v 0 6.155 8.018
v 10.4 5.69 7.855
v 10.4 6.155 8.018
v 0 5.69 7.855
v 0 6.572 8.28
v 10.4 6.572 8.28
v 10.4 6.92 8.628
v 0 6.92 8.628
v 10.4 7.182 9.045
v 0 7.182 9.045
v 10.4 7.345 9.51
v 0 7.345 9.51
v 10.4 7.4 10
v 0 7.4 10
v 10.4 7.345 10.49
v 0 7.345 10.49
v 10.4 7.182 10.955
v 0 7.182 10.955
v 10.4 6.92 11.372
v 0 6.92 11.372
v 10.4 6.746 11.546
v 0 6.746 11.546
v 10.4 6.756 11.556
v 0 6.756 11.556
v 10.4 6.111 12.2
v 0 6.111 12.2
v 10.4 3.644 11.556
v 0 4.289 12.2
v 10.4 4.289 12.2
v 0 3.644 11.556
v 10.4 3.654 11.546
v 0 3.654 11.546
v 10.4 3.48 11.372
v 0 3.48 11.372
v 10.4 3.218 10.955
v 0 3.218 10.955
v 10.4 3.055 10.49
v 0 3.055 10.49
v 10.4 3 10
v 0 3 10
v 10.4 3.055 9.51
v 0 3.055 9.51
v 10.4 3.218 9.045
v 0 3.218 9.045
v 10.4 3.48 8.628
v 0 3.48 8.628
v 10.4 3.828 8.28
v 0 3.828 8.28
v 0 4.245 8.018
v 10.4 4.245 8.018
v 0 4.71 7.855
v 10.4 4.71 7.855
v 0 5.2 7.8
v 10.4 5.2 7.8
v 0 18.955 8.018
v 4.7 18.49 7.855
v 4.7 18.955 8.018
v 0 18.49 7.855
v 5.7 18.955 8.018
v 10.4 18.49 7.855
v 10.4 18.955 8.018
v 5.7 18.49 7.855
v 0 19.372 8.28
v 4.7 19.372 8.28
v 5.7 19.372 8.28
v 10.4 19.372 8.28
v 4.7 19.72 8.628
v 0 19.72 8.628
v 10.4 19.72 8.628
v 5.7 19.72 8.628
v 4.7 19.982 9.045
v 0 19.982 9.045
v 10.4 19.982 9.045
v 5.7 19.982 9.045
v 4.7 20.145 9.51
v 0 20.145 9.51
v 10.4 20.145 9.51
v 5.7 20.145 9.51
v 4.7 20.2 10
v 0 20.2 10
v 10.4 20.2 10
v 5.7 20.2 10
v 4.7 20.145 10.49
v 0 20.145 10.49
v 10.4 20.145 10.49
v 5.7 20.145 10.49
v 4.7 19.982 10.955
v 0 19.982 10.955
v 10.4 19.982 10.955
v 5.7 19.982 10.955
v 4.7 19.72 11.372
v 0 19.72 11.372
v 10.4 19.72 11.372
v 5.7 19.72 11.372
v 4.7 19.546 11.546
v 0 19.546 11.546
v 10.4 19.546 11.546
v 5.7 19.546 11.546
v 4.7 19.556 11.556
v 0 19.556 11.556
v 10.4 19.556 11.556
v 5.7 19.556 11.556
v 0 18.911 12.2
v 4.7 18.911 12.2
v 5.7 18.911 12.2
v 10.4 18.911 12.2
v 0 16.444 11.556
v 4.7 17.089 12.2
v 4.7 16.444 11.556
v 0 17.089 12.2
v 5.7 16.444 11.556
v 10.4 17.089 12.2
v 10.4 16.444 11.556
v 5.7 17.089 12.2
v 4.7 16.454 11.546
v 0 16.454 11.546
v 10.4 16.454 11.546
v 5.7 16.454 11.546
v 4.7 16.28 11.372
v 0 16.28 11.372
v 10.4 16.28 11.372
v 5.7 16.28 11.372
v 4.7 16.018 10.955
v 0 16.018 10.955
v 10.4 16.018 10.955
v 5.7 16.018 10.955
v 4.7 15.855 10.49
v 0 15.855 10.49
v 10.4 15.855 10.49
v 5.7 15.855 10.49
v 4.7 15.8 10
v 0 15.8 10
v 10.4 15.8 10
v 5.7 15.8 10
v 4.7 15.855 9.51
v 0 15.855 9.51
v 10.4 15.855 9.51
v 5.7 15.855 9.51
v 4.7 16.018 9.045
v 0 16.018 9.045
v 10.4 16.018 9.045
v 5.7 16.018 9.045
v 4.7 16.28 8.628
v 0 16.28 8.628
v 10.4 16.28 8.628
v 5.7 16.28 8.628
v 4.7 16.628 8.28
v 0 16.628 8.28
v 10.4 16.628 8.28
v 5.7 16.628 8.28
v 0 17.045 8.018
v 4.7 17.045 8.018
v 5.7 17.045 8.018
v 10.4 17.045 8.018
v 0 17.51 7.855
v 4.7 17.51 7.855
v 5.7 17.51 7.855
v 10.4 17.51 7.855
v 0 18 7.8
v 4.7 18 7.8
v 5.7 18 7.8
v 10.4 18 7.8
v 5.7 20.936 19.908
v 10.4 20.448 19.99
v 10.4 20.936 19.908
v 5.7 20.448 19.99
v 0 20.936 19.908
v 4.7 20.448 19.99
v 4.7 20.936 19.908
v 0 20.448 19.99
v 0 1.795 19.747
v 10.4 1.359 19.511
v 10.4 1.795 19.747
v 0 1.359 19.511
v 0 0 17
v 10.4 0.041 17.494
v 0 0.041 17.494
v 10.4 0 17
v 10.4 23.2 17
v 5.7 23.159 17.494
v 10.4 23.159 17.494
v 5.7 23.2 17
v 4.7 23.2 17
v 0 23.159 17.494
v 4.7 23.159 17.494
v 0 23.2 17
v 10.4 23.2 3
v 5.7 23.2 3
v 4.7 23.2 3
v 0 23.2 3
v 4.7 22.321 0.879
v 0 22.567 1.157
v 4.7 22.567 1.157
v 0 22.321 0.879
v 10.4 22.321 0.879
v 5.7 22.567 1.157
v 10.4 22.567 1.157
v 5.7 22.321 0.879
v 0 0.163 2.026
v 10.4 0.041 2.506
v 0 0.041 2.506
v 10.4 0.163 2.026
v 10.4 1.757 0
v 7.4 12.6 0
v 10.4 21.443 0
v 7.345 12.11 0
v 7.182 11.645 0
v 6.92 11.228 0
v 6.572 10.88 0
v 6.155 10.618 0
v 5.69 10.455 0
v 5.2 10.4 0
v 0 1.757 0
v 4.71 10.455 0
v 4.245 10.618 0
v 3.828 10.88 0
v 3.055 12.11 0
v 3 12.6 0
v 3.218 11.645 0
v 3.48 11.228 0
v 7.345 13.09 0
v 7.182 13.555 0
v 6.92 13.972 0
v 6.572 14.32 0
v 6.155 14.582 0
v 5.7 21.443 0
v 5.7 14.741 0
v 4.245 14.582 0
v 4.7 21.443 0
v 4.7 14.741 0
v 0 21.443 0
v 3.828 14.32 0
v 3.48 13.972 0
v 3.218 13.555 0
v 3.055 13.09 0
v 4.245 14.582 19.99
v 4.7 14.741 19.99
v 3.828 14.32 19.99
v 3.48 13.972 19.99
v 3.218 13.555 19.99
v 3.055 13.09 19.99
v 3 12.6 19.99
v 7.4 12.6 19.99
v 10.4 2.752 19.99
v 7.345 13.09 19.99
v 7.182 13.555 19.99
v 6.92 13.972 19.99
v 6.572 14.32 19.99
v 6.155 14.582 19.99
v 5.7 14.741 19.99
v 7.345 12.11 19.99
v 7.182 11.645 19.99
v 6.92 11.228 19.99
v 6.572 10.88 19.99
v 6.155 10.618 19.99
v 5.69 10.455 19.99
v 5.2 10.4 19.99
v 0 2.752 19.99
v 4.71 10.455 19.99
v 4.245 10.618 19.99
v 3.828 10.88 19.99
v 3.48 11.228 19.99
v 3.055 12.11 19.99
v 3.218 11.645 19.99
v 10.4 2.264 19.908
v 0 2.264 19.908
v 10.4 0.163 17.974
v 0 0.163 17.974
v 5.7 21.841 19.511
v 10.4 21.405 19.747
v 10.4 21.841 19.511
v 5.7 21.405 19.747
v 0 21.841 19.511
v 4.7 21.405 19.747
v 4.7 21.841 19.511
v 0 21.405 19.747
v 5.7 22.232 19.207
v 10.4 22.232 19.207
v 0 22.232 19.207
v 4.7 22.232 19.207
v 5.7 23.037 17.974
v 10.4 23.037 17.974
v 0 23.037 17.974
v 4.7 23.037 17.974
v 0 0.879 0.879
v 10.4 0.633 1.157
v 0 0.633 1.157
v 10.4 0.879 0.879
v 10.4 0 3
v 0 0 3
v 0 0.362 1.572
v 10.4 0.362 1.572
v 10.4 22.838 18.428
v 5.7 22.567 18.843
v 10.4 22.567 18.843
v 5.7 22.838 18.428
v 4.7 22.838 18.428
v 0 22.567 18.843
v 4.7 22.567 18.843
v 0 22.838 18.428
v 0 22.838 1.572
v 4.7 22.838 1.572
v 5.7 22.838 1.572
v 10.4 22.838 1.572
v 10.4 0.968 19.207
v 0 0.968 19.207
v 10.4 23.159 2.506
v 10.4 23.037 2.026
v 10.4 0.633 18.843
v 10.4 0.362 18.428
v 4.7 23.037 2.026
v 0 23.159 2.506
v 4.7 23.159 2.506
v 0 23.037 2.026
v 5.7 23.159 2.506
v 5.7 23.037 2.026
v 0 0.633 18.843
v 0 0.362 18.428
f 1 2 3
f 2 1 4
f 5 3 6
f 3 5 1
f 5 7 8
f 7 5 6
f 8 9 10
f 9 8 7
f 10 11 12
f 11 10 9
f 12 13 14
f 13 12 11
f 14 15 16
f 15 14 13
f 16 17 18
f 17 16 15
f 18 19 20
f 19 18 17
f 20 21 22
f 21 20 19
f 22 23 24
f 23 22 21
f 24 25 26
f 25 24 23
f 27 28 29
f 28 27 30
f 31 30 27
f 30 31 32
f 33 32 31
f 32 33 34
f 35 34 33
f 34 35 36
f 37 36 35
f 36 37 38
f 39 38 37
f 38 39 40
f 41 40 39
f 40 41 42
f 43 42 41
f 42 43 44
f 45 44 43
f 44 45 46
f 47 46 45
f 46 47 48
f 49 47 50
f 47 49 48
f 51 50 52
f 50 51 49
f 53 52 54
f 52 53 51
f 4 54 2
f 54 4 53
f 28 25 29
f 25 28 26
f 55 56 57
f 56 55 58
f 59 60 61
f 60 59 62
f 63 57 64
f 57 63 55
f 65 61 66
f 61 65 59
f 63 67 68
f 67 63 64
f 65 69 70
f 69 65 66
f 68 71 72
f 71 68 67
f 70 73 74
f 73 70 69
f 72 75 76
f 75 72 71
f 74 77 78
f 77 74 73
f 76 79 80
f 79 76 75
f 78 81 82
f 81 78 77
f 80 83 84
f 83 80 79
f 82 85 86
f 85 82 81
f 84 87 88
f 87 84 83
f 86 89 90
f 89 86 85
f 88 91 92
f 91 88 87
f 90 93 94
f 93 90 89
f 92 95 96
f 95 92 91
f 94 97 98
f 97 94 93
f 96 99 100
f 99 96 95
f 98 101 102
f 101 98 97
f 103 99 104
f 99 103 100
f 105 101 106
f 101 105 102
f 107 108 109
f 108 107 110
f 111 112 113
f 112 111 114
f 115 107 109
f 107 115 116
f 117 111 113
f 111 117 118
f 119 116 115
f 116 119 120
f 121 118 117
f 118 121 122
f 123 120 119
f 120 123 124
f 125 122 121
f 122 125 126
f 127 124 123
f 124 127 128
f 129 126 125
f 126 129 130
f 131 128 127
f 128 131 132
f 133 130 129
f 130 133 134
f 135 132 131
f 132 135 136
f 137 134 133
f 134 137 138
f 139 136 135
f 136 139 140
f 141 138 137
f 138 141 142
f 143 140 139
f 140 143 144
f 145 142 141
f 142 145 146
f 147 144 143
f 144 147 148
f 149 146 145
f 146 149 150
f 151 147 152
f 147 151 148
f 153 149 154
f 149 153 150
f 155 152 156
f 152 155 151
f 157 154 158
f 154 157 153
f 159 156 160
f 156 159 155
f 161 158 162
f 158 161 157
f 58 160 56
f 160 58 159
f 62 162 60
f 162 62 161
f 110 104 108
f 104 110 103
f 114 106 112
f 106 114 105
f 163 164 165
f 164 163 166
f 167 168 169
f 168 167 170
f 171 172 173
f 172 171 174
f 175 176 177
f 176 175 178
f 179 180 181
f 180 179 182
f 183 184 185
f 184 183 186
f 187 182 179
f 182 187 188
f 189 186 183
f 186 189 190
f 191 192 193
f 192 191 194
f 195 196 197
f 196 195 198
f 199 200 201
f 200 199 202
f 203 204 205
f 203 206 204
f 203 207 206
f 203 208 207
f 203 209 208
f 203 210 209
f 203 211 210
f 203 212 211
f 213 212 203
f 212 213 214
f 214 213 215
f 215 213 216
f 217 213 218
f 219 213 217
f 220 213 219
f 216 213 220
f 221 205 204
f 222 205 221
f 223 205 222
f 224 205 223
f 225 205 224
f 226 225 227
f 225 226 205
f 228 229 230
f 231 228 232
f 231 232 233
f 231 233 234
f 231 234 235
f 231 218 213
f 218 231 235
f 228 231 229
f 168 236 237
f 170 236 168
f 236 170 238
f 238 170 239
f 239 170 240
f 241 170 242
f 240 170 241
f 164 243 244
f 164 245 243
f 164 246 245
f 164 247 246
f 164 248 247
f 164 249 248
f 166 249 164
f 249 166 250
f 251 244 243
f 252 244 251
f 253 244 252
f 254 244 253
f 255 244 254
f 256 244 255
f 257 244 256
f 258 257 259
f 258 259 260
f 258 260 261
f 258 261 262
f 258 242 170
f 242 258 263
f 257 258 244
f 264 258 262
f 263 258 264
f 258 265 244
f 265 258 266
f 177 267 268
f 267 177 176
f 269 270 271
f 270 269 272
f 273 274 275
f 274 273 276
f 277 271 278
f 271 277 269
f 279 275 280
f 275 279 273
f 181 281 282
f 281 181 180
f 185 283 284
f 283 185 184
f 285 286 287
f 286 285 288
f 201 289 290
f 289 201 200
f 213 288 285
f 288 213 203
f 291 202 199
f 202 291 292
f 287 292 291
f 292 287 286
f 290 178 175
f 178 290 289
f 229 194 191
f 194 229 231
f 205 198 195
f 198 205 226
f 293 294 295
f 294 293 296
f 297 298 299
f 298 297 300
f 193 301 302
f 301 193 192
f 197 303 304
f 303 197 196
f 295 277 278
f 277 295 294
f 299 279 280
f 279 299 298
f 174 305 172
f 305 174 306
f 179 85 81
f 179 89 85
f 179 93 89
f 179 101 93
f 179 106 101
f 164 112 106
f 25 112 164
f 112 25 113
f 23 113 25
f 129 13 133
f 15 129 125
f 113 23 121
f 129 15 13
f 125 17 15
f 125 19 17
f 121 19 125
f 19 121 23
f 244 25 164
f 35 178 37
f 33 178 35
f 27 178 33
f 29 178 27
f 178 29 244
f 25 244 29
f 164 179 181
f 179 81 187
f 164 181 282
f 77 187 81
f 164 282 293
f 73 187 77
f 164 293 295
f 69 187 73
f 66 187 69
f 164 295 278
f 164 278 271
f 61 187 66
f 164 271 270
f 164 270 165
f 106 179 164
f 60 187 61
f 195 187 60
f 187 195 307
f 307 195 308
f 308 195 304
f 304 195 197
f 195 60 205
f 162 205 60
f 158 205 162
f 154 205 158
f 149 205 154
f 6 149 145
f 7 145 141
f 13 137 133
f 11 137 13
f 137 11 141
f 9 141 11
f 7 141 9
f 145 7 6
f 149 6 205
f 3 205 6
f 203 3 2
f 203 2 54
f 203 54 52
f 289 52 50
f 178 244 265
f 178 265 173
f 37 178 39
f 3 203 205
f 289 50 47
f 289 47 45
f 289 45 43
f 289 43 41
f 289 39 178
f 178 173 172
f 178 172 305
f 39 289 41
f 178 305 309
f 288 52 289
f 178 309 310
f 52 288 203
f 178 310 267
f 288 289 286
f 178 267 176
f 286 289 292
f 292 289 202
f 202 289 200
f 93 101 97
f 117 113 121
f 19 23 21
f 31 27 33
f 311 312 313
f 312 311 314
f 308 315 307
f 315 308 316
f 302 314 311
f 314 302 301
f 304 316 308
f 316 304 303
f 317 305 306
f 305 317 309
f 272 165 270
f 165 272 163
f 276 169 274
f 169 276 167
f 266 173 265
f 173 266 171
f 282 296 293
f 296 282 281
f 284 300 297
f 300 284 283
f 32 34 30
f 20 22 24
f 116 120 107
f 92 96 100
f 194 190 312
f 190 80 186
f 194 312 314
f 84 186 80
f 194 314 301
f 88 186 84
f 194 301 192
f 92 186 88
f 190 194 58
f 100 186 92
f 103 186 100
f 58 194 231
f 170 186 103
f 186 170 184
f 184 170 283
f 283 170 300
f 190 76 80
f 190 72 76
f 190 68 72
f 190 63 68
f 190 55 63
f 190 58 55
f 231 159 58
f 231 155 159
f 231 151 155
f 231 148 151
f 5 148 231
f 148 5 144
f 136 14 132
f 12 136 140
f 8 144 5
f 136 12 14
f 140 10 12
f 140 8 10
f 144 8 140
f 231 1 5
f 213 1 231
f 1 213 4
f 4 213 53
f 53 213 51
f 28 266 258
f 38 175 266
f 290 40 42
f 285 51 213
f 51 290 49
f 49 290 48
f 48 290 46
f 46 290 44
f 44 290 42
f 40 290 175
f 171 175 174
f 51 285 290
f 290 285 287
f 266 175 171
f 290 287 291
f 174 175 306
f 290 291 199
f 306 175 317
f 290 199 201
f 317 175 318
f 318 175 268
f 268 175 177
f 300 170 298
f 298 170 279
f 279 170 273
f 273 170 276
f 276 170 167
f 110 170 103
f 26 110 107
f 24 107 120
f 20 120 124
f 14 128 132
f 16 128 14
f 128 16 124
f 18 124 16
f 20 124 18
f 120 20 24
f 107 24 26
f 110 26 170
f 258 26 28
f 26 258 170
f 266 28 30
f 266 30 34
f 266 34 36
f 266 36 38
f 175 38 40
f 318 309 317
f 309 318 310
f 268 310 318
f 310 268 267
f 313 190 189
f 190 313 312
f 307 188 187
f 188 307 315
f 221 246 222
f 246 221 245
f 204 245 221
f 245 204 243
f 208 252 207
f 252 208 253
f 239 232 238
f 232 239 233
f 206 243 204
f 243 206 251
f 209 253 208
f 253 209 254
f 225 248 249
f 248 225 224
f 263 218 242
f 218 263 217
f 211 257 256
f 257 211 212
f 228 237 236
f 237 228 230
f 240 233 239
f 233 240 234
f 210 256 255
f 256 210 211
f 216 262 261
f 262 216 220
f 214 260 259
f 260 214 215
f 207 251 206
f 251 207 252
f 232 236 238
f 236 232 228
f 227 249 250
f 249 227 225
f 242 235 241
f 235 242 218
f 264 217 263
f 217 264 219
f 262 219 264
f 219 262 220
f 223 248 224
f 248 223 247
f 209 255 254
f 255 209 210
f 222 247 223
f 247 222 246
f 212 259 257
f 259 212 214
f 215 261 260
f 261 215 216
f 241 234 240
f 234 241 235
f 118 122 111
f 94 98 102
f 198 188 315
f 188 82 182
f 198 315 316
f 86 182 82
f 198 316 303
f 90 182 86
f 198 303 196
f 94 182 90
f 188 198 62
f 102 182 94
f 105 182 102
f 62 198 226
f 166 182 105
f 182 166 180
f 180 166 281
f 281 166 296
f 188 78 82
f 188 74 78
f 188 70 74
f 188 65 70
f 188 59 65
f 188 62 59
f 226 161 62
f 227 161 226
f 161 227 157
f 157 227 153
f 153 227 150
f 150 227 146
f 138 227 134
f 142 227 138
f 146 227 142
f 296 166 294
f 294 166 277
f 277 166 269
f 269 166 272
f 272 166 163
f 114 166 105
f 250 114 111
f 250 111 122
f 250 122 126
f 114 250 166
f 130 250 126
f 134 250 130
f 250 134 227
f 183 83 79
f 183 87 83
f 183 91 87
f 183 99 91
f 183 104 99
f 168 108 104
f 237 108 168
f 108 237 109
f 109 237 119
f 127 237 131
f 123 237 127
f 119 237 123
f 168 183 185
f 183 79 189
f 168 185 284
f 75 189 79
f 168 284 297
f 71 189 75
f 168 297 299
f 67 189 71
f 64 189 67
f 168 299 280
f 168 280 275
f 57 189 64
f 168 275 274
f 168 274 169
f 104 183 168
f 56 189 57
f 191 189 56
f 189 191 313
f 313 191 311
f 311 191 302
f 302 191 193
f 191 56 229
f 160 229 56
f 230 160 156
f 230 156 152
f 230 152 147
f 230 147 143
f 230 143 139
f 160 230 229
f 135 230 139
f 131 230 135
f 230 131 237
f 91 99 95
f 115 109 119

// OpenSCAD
// file: functions.scad
/*******************************************************************

This OpenSCAD code and its rendered 3D model are part of the

	Kühling&Kühling RepRap Industrial 3D Printer


All details, BOM, assembling instructions and latest sources:
	http://kuehlingkuehling.de

Designed and developed by:
	Jonas Kühling <mail@jonaskuehling.de>
	Simon Kühling <mail@simonkuehling.de>

Licensed under:
	Creative Commons Attribution-ShareAlike
	CC BY-SA 3.0
	http://creativecommons.org/licenses/by-sa/3.0/

*******************************************************************/

module teardrop (r=4.5,h=20,alpha=45,teardropcorner=0,fulldrop=0){		// tear drop hole for top-centering
											// use teardropcorner=1 for bottom horizontal corners
	render()
	translate([-h/2,0,0])
		rotate([-270,0+(teardropcorner*180),90])
			difference(){
				linear_extrude(height=h){
					circle(r);
					polygon(points=[[0,0],[r*cos(alpha),r*sin(alpha)],[0,r/sin(alpha)],[-r*cos(alpha),r*sin(alpha)]], paths=[[0,1,2,3]]);
				}
				if(fulldrop==0) 
					translate([0,(r/sin(alpha))/2+r,h/2]) cube([2*r+2,r/sin(alpha),h+2],center=true);
			}
}

//teardrop(4.5,22,fulldrop=true);



module teardropcentering (r=4.5,h=20,alpha=45){				// tear drop hole for top-centering
	centering_offset_factor = 1.1;
	render()
	translate([-h/2,0,0])
		rotate([-270,0,90])
			difference(){
				linear_extrude(height=h){
					circle(r, $fn=24);
					polygon(points=[[0,0],[r*cos(alpha),r*sin(alpha)],[0,r/sin(alpha)],[-r*cos(alpha),r*sin(alpha)]], paths=[[0,1,2,3]]);
				}
				translate([0,(r/sin(alpha))/2+r*centering_offset_factor,h/2]) cube([2*r+2,r/sin(alpha),h+2],center=true);
			}
}

//teardropcentering();



module teardropcentering_half (r=4.5,h=20, bottom=0,alpha=45){				// tear drop hole for top-centering
																// upper half (bottom=0) or bottom half (bottom=1)
	centering_offset_factor = 1.2;
	render()
	translate([-h/2,0,0])
		rotate([-270,0,90])
			difference(){
				linear_extrude(height=h){
					circle(r, $fn=24);
					polygon(points=[[0,0],[r*cos(alpha),r*sin(alpha)],[0,r/sin(alpha)],[-r*cos(alpha),r*sin(alpha)]], paths=[[0,1,2,3]]);
				}
				translate([0,(r/sin(alpha))/2+r*centering_offset_factor,h/2]) cube([2*r+2,r/sin(alpha),h+2],center=true);
				translate([0,-(r*centering_offset_factor)/2-0.5+bottom*(r*centering_offset_factor+1),h/2]) cube([2*r+2,r*centering_offset_factor+1,h+2],center=true);
			}
}

//teardropcentering_half(bottom=0);


module polyhole(d,h){
	n = max(round(2 * d),3);
	cylinder(h = h, r = (d / 2) / cos (180 / n), $fn = n, center=true);
}



module roundcorner(radius,edge_length){
	render()
	translate([0,0,-1])
		difference(){
			translate([-1,-1,0])
				cube(size = [radius+1,radius+1,edge_length+2], center = false);
			translate(v = [radius,radius,-1])
				cylinder(h = edge_length+4, r=radius, center=false,$fs=0.1);
		}
}

//roundcorner(5,5);



module roundcorner_tear(radius,edge_length){
	render()
	difference(){
		translate([-1,-1,-1])
			cube(size = [edge_length+2, radius+1, radius+1], center = false);
		translate([(edge_length+4)/2-2, radius, radius])
			teardrop(radius, edge_length+4,teardropcorner=1);
	}
}

//roundcorner_tear(8,20);


module roundedge_tear(radius){
	render()
	difference(){
		translate([-1,-1,-1])
			cube(size = [radius+1, radius+1, radius+1], center = false);
		translate([radius,radius,radius])
			union(){
				sphere(r=radius, $fs=0.1);
				translate([0,0,-radius])
					cylinder(r1=(radius*sin(45))-(radius-(radius*sin(45))),r2=radius*sin(45),h=(radius-(radius*sin(45))), $fs=0.1);
			}
	}
}

//roundedge_tear(20);



module roundedge(radius){
	render()
	difference(){
		translate([-1,-1,-1])
			cube(size = [radius+1, radius+1, radius+1], center = false);
		translate([radius,radius,radius])
			sphere(r=radius, $fs=0.1);
	}
}

//roundedge(5);


module nut_trap(nut_wrench_size,trap_height,vertical=0, clearance=0.2,center=true){		// M3 wrench size = 5.5
	radius = cornerdiameter(nut_wrench_size+2*clearance) /2;
	rotate([0,vertical*90,0])
		cylinder(h = trap_height, r = radius, center=center, $fn = 6);
}

//nut_trap(5,5,0);

module nut_slot(nut_wrench_size,nut_height, nut_elevation,vertical=0, clearance=0.2){		// M3 wrench size = 5.5
	radius = cornerdiameter(nut_wrench_size+2*clearance) /2;
	slot_height = nut_height+2*clearance;
	slot_width = nut_wrench_size+2*clearance;
	rotate([0,vertical*270,0]){
		cylinder(h = slot_height, r = radius, center=true, $fn = 6);
		translate([0,-slot_width/2,-slot_height/2]) cube([nut_elevation+1,slot_width,slot_height]);
	}
}

//nut_slot(5.5,3,4,1);

function cornerdiameter(wrench_size) =  2* ((wrench_size)/2)/ cos(180/6);
function cornerdiameter_8(wrench_size) =  2* ((wrench_size)/2)/ cos(180/8);
// main file
/*******************************************************************

This OpenSCAD code and its rendered 3D model are part of the

	Kühling&Kühling RepRap Industrial 3D Printer


All details, BOM, assembling instructions and latest sources:
	http://kuehlingkuehling.de

Designed and developed by:
	Jonas Kühling <mail@jonaskuehling.de>
	Simon Kühling <mail@simonkuehling.de>

Licensed under:
	Creative Commons Attribution-ShareAlike
	CC BY-SA 3.0
	http://creativecommons.org/licenses/by-sa/3.0/

*******************************************************************/

include <configuration.scad>

z_bed_bolt_screw_dia = m4_screw_dia;

z_bedclamp_back_body_height = frame_width;
z_bedclamp_back_body_width = wall+2*clearance+z_bed_bolt_screw_dia+wall;
z_bedclamp_back_body_length = frame_washer_wall+2*clearance+frame_screw_dia+wall+2*clearance+z_bed_bolt_screw_dia+wall_thin+2*clearance+frame_screw_dia+frame_washer_wall;


z_bedclamp_back();


module z_bedclamp_back(){
	difference(){

		// main body
		hull(){
			translate([z_bedclamp_back_body_width/2,wall,wall])
				rotate([180,0,0])
					teardrop(wall,z_bedclamp_back_body_width);
			translate([z_bedclamp_back_body_width/2,z_bedclamp_back_body_length-wall,wall])
				rotate([180,0,0])
					teardrop(wall,z_bedclamp_back_body_width);
			translate([z_bedclamp_back_body_width/2,wall,z_bedclamp_back_body_height-wall])
				rotate([180,0,0])
					teardrop(wall,z_bedclamp_back_body_width);
			translate([z_bedclamp_back_body_width/2,z_bedclamp_back_body_length-wall,z_bedclamp_back_body_height-wall])
				rotate([180,0,0])
					teardrop(wall,z_bedclamp_back_body_width);
		}

		// bed bolt clamp
		translate([z_bedclamp_back_body_width/2,z_bedclamp_back_body_length-(z_bed_bolt_screw_dia/2+clearance+wall_thin+2*clearance+frame_screw_dia+frame_washer_wall),-1])
			cylinder(r=z_bed_bolt_screw_dia/2+clearance,h=frame_width+2);
		translate([z_bedclamp_back_body_width/2-wall_thin/2,z_bedclamp_back_body_length-(z_bed_bolt_screw_dia/2+clearance+wall_thin+2*clearance+frame_screw_dia+frame_washer_wall),-1])
			cube([wall_thin,z_bedclamp_back_body_length,z_bedclamp_back_body_height+2]);

		// clamp and frame screw holes
		translate([z_bedclamp_back_body_width/2,frame_washer_wall+clearance+frame_screw_dia/2,z_bedclamp_back_body_height/2])
			teardrop(frame_screw_dia/2+clearance,z_bedclamp_back_body_width+2);
		translate([z_bedclamp_back_body_width/2,z_bedclamp_back_body_length-(frame_washer_wall+clearance+frame_screw_dia/2),z_bedclamp_back_body_height/2])
			teardrop(frame_screw_dia/2+clearance,z_bedclamp_back_body_width+2);

	}
}
